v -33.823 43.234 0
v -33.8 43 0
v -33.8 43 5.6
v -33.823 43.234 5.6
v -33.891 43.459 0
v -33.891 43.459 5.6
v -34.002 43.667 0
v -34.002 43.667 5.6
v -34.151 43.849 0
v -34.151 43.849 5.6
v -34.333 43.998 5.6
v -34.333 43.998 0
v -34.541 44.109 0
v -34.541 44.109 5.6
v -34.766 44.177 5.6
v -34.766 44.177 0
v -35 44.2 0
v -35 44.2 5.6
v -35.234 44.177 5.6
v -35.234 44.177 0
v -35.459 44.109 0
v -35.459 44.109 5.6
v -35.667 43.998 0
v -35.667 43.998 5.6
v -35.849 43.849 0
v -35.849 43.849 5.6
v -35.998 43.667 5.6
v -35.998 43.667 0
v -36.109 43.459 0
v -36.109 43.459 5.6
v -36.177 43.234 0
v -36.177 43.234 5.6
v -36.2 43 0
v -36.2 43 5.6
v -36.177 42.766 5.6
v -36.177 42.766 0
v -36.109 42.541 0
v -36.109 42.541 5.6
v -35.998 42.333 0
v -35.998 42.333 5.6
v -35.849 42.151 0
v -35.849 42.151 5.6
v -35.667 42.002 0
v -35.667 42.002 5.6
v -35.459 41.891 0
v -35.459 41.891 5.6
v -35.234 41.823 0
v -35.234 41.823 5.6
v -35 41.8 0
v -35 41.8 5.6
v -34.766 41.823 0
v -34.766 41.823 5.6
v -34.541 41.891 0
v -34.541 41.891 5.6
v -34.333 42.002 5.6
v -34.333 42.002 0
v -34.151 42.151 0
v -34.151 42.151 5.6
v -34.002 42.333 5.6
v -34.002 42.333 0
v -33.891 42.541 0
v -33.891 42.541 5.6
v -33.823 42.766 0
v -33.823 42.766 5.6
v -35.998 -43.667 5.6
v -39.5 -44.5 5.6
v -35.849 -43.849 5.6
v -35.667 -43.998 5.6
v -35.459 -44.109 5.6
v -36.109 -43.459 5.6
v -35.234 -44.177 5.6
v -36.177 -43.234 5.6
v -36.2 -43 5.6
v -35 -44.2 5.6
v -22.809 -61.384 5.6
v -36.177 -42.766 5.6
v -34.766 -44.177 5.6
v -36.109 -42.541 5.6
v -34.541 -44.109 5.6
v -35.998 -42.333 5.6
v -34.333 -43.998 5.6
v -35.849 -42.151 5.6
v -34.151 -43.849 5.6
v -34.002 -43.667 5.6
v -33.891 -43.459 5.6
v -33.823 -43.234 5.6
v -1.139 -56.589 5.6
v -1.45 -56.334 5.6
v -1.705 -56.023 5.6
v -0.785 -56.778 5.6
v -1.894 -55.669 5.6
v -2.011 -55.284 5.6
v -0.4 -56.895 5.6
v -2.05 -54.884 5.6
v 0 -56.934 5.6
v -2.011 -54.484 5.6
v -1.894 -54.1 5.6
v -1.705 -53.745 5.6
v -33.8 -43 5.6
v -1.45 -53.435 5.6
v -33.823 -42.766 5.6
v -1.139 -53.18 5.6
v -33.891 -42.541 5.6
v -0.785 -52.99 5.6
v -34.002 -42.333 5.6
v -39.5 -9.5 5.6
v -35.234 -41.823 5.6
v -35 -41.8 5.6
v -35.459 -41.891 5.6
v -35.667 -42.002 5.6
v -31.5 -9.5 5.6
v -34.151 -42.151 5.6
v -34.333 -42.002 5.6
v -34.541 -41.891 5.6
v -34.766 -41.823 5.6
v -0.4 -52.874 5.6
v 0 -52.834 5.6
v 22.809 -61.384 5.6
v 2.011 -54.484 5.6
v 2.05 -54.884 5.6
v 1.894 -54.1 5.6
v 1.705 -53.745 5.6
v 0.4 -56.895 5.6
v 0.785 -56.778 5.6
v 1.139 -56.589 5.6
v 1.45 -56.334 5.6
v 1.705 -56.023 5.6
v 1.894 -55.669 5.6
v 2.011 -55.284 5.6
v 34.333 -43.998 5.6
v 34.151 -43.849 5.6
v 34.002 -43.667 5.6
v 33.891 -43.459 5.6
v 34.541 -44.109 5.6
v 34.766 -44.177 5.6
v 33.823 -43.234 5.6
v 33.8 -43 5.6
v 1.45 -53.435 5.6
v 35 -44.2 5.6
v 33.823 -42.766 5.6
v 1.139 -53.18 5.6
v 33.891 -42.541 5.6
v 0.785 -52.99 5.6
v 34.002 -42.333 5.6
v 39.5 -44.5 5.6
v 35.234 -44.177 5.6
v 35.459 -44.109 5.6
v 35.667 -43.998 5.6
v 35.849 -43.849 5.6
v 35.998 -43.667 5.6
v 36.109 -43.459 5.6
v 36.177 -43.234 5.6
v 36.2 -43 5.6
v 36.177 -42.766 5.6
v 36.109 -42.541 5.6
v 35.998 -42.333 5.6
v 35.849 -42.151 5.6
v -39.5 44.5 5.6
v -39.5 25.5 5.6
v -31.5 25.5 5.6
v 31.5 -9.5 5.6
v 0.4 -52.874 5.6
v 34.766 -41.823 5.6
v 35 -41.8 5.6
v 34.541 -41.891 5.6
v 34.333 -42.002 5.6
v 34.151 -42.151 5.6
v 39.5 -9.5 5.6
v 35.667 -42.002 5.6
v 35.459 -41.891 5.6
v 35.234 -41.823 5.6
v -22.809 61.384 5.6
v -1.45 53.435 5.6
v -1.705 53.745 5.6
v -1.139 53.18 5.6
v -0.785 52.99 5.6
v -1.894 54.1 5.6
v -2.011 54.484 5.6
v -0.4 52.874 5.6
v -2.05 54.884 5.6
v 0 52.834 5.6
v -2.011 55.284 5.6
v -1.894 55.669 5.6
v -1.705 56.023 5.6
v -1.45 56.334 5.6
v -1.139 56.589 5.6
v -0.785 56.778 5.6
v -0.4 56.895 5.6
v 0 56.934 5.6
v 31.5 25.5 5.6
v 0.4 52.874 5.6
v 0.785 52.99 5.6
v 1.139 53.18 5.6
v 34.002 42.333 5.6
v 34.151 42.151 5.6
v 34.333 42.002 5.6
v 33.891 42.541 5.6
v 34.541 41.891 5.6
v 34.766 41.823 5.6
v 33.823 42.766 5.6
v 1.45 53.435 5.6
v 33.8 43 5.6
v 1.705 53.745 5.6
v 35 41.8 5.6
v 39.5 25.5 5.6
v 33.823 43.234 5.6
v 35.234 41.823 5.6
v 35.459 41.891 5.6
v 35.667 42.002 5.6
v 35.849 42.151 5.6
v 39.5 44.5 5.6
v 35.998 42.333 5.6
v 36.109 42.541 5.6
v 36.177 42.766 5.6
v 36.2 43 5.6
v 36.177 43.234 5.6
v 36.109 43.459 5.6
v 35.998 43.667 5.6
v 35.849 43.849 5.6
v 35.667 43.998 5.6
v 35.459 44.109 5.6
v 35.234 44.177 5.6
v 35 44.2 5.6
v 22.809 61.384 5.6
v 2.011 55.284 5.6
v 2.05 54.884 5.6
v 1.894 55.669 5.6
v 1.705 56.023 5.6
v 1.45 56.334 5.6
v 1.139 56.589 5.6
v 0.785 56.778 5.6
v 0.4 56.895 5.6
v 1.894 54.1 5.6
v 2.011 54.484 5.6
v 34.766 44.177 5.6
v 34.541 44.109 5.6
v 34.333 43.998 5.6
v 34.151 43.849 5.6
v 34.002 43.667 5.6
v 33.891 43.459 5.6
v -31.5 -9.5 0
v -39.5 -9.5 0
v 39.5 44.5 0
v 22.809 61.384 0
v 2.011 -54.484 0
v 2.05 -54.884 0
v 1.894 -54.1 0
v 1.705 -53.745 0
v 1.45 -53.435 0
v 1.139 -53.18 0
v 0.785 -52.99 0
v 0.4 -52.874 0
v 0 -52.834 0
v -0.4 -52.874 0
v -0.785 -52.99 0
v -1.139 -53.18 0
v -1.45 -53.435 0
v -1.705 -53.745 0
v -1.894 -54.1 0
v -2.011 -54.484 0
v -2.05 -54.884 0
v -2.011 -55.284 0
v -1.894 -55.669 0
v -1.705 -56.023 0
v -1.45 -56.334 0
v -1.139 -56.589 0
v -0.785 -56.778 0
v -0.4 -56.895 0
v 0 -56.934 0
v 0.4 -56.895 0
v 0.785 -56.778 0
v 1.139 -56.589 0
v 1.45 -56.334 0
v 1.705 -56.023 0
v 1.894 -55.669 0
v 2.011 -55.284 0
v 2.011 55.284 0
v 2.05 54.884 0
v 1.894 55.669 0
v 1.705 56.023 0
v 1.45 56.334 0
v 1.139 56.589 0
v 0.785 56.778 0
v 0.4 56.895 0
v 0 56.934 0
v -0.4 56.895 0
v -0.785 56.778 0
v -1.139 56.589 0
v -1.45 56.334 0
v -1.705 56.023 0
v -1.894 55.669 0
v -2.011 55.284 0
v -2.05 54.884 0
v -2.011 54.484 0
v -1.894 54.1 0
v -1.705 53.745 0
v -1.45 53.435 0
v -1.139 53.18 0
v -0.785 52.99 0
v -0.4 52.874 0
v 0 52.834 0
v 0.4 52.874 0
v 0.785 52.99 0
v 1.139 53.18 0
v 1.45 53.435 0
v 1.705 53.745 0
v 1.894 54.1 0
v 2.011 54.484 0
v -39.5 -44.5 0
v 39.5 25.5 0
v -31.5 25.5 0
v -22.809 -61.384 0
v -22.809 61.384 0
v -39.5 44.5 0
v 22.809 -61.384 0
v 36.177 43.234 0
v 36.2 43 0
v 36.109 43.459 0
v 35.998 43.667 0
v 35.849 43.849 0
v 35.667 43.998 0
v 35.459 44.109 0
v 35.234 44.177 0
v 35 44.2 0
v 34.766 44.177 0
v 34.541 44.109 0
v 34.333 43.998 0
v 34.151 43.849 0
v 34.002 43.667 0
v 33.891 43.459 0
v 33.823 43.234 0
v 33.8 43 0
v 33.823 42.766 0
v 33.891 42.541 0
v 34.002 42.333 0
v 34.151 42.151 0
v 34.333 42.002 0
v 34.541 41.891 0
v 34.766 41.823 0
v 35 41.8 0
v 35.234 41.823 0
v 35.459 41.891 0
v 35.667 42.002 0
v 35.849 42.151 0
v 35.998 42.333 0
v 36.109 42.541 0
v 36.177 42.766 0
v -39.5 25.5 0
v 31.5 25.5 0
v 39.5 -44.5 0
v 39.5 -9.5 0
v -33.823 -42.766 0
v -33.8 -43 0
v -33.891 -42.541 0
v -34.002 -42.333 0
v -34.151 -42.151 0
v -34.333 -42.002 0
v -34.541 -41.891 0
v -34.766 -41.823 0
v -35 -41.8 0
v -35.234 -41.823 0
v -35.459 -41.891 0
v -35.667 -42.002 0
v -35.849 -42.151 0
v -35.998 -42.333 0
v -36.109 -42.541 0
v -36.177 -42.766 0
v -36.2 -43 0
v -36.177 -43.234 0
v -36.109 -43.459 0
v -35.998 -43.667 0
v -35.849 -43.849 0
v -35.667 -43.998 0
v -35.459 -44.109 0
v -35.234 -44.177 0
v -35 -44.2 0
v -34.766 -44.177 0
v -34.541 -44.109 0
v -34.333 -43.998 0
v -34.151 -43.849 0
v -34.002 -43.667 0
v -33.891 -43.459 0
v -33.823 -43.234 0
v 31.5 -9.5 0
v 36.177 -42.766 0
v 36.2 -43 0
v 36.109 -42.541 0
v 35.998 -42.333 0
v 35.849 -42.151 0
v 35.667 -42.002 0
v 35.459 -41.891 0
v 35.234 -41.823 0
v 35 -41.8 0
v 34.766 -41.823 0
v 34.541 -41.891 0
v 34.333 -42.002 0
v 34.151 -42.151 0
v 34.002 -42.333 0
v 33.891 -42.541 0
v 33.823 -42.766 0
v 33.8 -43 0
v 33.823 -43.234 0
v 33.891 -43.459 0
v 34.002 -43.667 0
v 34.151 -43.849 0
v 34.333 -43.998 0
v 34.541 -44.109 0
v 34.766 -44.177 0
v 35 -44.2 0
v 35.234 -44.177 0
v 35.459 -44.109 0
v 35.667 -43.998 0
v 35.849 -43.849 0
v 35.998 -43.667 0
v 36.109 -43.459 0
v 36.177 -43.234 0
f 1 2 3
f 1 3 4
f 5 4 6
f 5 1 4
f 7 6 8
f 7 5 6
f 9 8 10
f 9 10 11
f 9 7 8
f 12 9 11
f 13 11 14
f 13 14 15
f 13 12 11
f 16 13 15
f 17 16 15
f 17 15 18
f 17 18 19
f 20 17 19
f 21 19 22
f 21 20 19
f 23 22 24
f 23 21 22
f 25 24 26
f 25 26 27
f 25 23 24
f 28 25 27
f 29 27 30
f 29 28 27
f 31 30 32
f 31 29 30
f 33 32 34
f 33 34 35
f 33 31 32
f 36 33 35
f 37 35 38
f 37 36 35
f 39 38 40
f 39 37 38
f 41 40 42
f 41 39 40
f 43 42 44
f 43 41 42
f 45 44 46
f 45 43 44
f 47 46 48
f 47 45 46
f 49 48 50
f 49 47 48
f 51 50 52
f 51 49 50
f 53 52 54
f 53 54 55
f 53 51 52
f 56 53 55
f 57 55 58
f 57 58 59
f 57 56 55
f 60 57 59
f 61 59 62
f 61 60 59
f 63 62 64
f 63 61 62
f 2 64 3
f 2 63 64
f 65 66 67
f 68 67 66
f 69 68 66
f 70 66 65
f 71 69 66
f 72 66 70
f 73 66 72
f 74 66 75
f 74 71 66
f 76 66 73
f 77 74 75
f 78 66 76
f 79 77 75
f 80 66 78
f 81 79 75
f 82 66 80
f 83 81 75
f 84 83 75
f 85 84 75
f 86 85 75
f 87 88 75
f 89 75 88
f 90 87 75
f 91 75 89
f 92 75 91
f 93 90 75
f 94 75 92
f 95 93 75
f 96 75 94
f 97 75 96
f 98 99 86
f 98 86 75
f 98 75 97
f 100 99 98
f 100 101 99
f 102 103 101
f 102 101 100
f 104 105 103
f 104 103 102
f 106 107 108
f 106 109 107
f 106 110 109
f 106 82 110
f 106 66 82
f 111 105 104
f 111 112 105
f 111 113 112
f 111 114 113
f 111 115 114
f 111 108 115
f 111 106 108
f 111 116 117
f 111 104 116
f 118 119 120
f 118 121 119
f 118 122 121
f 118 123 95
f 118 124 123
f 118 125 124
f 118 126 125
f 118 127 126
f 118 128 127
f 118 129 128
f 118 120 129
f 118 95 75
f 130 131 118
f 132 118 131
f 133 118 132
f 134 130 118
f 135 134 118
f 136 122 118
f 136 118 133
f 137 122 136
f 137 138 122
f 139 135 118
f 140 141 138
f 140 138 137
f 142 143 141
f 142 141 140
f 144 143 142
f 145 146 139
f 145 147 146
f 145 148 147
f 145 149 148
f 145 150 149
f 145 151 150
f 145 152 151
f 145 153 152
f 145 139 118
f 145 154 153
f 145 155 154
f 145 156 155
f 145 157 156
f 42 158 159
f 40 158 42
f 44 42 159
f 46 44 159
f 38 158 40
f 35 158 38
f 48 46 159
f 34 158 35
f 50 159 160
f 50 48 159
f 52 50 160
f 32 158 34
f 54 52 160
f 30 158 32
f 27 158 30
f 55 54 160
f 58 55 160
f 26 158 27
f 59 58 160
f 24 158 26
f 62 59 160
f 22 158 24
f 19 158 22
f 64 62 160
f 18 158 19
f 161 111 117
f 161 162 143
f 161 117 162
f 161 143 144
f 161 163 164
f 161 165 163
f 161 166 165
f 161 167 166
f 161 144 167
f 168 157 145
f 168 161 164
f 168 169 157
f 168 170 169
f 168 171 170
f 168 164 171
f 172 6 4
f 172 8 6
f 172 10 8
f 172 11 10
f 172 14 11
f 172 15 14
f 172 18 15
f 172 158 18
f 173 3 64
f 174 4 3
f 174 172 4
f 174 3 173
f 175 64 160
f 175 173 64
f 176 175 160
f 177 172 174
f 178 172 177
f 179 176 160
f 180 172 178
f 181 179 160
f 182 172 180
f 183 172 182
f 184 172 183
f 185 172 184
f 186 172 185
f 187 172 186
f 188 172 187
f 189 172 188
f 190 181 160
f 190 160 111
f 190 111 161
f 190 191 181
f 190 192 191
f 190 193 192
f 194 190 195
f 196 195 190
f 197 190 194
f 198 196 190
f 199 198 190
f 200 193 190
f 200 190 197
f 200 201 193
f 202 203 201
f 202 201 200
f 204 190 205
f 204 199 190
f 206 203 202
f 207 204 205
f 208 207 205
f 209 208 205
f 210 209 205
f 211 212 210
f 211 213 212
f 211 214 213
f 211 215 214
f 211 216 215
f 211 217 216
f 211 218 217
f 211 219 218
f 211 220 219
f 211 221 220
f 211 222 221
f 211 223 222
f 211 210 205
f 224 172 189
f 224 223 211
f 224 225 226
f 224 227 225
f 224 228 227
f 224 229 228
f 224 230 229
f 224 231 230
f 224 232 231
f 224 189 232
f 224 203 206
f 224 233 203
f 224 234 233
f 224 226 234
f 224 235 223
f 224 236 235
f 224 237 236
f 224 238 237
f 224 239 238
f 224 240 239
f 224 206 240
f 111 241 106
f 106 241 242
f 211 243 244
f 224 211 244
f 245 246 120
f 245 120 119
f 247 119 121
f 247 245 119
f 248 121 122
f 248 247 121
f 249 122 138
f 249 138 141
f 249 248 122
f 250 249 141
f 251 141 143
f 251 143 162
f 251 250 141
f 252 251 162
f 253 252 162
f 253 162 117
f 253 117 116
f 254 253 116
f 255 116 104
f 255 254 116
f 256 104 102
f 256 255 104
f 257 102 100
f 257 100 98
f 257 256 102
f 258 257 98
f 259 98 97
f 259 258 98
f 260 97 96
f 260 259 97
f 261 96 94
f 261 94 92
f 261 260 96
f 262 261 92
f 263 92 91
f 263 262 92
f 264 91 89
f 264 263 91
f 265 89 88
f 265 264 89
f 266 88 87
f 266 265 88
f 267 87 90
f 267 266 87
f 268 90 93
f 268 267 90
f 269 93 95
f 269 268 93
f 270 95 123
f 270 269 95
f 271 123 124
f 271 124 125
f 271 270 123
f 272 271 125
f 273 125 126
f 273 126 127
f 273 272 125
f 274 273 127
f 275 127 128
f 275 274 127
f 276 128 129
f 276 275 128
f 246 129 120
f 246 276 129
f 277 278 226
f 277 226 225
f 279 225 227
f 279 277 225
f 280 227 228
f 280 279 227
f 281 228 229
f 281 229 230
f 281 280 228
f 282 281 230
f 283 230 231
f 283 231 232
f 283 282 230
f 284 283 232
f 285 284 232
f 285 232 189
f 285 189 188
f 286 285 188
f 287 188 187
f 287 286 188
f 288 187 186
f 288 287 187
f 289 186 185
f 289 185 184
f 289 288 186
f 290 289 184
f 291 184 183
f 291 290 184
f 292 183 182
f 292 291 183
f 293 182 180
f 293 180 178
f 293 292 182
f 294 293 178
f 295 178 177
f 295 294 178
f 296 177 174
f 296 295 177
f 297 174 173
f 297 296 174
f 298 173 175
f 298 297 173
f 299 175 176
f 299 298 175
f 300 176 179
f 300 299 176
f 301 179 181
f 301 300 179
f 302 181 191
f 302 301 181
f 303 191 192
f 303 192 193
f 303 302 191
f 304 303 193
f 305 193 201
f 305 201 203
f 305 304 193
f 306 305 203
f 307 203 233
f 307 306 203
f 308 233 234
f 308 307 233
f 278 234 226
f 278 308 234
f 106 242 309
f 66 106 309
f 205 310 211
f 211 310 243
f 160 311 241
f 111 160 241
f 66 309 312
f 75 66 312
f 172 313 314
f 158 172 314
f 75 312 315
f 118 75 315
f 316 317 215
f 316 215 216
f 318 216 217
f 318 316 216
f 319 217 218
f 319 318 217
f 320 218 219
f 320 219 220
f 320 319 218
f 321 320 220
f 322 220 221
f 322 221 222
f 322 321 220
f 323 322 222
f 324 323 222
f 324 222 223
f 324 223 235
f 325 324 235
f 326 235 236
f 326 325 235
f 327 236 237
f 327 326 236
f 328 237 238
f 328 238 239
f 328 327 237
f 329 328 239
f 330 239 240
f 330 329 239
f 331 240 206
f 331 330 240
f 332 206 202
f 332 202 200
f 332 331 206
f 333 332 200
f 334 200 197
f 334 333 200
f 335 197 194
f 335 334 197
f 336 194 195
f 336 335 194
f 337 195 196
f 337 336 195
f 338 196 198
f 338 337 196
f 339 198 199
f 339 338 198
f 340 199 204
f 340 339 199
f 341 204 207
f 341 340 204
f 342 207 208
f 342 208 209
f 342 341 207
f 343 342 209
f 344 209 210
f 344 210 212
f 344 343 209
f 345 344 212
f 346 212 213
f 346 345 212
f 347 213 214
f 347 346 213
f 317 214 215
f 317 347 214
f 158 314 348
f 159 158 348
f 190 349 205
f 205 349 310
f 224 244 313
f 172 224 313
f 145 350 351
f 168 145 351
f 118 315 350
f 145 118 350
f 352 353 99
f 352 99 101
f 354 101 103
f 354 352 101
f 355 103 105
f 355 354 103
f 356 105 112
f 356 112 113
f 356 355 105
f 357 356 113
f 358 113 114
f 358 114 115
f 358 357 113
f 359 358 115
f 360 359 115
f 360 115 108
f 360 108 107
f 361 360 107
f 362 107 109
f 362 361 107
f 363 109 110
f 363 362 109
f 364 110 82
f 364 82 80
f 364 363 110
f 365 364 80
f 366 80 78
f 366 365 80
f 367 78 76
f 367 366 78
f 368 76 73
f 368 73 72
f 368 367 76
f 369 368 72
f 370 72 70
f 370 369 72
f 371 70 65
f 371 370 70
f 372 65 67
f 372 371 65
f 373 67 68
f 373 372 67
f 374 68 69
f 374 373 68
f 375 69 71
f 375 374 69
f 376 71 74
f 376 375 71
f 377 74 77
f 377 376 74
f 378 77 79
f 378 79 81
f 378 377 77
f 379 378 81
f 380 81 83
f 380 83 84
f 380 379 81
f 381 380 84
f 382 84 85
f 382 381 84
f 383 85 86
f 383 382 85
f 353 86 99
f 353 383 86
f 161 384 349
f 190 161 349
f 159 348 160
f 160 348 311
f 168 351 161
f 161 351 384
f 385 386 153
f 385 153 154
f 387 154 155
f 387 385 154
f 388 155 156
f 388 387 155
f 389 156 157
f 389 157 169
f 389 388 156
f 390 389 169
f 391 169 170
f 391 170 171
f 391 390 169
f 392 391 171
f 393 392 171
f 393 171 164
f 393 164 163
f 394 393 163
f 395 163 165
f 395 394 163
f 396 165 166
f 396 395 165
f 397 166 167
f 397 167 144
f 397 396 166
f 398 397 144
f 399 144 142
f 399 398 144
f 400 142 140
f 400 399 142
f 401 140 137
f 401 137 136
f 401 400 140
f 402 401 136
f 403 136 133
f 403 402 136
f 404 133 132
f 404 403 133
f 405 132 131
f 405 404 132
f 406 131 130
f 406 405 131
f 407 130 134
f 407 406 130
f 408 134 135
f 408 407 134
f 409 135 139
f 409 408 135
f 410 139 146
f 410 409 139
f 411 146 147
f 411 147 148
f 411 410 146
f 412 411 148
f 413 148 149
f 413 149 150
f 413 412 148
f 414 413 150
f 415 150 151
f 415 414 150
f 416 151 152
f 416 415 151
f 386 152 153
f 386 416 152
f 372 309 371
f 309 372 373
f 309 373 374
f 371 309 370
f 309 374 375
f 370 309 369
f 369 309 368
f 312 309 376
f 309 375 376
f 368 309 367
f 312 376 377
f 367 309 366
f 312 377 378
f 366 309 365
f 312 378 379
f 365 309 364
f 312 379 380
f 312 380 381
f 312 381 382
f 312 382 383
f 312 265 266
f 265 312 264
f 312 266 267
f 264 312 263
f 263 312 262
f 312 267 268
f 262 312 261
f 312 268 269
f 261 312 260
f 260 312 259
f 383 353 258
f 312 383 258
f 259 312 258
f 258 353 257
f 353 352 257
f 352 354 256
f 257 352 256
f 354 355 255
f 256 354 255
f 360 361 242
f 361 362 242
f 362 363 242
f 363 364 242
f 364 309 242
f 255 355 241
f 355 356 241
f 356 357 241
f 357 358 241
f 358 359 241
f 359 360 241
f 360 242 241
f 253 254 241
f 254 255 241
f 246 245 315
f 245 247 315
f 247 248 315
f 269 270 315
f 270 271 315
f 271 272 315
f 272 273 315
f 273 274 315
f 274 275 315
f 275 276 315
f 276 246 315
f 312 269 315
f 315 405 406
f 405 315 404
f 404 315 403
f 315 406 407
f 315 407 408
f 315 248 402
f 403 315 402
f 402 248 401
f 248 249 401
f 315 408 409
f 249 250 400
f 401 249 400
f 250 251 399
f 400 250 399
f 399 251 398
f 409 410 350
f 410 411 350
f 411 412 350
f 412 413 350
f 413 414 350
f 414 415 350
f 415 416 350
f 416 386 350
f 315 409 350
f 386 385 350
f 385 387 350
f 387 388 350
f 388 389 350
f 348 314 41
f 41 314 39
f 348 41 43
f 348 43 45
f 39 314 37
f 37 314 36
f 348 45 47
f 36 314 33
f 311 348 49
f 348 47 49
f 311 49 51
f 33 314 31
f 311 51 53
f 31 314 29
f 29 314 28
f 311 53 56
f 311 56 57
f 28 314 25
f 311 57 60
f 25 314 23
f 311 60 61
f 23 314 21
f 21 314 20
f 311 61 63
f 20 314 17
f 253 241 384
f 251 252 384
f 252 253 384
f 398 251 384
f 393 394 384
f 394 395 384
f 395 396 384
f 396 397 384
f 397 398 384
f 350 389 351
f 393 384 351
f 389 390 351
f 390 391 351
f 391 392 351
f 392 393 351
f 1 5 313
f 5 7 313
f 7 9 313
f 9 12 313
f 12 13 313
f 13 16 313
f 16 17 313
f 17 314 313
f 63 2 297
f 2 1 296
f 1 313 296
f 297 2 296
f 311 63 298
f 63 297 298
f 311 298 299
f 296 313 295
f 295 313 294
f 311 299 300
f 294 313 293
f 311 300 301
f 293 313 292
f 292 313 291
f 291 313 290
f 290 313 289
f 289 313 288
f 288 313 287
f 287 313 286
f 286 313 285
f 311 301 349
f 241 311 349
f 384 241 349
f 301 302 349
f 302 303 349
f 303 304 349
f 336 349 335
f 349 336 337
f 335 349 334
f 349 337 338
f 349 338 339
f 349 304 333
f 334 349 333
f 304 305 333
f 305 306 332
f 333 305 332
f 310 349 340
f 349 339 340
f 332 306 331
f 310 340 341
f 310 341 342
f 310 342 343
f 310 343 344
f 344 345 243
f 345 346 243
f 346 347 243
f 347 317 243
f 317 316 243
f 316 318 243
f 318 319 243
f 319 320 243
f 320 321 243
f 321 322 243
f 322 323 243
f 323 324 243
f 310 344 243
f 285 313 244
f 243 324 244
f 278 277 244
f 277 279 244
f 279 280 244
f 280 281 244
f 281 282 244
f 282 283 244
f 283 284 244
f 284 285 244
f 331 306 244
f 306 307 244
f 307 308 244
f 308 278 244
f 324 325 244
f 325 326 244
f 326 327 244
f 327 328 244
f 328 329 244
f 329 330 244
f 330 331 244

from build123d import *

# Parameters (mm, degrees)
F0_R     = 1.2
F0_R_2   = 2.05
F1_DEPTH = 5.6


with BuildPart() as f1:
    # F0 (on Top) → F1 (new body)
    with BuildSketch(Plane.XY):
        with BuildLine():
            Line((31.5, 25.5), (39.5, 25.5))
            Line((39.5, 25.5), (39.5, 44.5))
            Line((39.5, 44.5), (22.808842361, 61.3844171166))
            Line((22.808842361, 61.3844171166), (0, 61.3844171166))
            Line((0, 61.3844171166), (-22.808842361, 61.3844171166))
            Line((-22.808842361, 61.3844171166), (-39.5, 44.5))
            Line((-39.5, 44.5), (-39.5, 25.5))
            Line((-39.5, 25.5), (-31.5, 25.5))
            Line((-31.5, 25.5), (-31.5, 18.901754251))
            ThreePointArc((-31.5, 18.901754251), (0, 41), (31.5, 18.901754251))
            Line((31.5, 18.901754251), (31.5, 25.5))
        make_face()
        with Locations((-35, 43)):
            Circle(F0_R, mode=Mode.SUBTRACT)
        with Locations((0, 54.8844171166)):
            Circle(F0_R_2, mode=Mode.SUBTRACT)
        with Locations((35, 43)):
            Circle(F0_R, mode=Mode.SUBTRACT)
        with BuildLine():
            ThreePointArc((-31.5, -3.901754251), (0, -26), (31.5, -3.901754251))
            Line((31.5, -3.901754251), (31.5, 18.901754251))
            ThreePointArc((31.5, 18.901754251), (0, 41), (-31.5, 18.901754251))
            Line((-31.5, 18.901754251), (-31.5, -3.901754251))
        make_face()
        with BuildLine():
            Line((22.808842361, -61.3844171166), (39.5, -44.5))
            Line((39.5, -44.5), (39.5, -9.5))
            Line((39.5, -9.5), (31.5, -9.5))
            Line((31.5, -9.5), (31.5, -3.901754251))
            ThreePointArc((31.5, -3.901754251), (0, -26), (-31.5, -3.901754251))
            Line((-31.5, -3.901754251), (-31.5, -9.5))
            Line((-31.5, -9.5), (-39.5, -9.5))
            Line((-39.5, -9.5), (-39.5, -44.5))
            Line((-39.5, -44.5), (-22.808842361, -61.3844171166))
            Line((-22.808842361, -61.3844171166), (0, -61.3844171166))
            Line((0, -61.3844171166), (22.808842361, -61.3844171166))
        make_face()
        with Locations((-35, -43)):
            Circle(F0_R, mode=Mode.SUBTRACT)
        with Locations((0, -54.8844171166)):
            Circle(F0_R_2, mode=Mode.SUBTRACT)
        with Locations((35, -43)):
            Circle(F0_R, mode=Mode.SUBTRACT)
    extrude(amount=F1_DEPTH)


solid = f1.part
